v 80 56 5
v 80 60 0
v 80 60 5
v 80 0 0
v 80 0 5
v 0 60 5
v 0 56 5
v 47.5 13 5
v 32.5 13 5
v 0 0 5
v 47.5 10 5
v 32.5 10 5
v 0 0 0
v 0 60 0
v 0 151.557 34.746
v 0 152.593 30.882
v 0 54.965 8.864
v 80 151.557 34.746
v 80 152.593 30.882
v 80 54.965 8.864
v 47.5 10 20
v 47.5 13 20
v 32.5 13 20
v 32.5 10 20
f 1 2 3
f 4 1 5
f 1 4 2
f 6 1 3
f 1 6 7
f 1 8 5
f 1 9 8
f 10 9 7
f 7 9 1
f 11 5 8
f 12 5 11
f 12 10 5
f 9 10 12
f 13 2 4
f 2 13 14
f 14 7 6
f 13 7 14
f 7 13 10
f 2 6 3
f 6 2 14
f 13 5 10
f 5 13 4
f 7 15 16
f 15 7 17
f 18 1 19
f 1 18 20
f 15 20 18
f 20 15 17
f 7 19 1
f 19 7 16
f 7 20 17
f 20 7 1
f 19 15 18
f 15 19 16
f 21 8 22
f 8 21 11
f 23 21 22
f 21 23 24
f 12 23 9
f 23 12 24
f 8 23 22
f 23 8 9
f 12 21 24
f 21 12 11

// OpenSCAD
// Parametric Phone Stand

/* [Dimensions] */
base_width = 80;      // [50:120]
base_depth = 60;      // [40:80]
base_height = 5;      // [3:10]
back_height = 100;    // [60:150]
back_thickness = 4;   // [2:8]
angle = 75;           // [60:85] Stand angle

/* [Phone Slot] */
slot_width = 15;      // [10:20]
slot_depth = 3;       // [2:5]

// Base
cube([base_width, base_depth, base_height]);

// Back support
translate([0, base_depth - back_thickness, base_height])
    rotate([90 - angle, 0, 0])
        cube([base_width, back_height, back_thickness]);

// Phone slot
translate([(base_width - slot_width)/2, 10, base_height])
    cube([slot_width, slot_depth, 15]);
